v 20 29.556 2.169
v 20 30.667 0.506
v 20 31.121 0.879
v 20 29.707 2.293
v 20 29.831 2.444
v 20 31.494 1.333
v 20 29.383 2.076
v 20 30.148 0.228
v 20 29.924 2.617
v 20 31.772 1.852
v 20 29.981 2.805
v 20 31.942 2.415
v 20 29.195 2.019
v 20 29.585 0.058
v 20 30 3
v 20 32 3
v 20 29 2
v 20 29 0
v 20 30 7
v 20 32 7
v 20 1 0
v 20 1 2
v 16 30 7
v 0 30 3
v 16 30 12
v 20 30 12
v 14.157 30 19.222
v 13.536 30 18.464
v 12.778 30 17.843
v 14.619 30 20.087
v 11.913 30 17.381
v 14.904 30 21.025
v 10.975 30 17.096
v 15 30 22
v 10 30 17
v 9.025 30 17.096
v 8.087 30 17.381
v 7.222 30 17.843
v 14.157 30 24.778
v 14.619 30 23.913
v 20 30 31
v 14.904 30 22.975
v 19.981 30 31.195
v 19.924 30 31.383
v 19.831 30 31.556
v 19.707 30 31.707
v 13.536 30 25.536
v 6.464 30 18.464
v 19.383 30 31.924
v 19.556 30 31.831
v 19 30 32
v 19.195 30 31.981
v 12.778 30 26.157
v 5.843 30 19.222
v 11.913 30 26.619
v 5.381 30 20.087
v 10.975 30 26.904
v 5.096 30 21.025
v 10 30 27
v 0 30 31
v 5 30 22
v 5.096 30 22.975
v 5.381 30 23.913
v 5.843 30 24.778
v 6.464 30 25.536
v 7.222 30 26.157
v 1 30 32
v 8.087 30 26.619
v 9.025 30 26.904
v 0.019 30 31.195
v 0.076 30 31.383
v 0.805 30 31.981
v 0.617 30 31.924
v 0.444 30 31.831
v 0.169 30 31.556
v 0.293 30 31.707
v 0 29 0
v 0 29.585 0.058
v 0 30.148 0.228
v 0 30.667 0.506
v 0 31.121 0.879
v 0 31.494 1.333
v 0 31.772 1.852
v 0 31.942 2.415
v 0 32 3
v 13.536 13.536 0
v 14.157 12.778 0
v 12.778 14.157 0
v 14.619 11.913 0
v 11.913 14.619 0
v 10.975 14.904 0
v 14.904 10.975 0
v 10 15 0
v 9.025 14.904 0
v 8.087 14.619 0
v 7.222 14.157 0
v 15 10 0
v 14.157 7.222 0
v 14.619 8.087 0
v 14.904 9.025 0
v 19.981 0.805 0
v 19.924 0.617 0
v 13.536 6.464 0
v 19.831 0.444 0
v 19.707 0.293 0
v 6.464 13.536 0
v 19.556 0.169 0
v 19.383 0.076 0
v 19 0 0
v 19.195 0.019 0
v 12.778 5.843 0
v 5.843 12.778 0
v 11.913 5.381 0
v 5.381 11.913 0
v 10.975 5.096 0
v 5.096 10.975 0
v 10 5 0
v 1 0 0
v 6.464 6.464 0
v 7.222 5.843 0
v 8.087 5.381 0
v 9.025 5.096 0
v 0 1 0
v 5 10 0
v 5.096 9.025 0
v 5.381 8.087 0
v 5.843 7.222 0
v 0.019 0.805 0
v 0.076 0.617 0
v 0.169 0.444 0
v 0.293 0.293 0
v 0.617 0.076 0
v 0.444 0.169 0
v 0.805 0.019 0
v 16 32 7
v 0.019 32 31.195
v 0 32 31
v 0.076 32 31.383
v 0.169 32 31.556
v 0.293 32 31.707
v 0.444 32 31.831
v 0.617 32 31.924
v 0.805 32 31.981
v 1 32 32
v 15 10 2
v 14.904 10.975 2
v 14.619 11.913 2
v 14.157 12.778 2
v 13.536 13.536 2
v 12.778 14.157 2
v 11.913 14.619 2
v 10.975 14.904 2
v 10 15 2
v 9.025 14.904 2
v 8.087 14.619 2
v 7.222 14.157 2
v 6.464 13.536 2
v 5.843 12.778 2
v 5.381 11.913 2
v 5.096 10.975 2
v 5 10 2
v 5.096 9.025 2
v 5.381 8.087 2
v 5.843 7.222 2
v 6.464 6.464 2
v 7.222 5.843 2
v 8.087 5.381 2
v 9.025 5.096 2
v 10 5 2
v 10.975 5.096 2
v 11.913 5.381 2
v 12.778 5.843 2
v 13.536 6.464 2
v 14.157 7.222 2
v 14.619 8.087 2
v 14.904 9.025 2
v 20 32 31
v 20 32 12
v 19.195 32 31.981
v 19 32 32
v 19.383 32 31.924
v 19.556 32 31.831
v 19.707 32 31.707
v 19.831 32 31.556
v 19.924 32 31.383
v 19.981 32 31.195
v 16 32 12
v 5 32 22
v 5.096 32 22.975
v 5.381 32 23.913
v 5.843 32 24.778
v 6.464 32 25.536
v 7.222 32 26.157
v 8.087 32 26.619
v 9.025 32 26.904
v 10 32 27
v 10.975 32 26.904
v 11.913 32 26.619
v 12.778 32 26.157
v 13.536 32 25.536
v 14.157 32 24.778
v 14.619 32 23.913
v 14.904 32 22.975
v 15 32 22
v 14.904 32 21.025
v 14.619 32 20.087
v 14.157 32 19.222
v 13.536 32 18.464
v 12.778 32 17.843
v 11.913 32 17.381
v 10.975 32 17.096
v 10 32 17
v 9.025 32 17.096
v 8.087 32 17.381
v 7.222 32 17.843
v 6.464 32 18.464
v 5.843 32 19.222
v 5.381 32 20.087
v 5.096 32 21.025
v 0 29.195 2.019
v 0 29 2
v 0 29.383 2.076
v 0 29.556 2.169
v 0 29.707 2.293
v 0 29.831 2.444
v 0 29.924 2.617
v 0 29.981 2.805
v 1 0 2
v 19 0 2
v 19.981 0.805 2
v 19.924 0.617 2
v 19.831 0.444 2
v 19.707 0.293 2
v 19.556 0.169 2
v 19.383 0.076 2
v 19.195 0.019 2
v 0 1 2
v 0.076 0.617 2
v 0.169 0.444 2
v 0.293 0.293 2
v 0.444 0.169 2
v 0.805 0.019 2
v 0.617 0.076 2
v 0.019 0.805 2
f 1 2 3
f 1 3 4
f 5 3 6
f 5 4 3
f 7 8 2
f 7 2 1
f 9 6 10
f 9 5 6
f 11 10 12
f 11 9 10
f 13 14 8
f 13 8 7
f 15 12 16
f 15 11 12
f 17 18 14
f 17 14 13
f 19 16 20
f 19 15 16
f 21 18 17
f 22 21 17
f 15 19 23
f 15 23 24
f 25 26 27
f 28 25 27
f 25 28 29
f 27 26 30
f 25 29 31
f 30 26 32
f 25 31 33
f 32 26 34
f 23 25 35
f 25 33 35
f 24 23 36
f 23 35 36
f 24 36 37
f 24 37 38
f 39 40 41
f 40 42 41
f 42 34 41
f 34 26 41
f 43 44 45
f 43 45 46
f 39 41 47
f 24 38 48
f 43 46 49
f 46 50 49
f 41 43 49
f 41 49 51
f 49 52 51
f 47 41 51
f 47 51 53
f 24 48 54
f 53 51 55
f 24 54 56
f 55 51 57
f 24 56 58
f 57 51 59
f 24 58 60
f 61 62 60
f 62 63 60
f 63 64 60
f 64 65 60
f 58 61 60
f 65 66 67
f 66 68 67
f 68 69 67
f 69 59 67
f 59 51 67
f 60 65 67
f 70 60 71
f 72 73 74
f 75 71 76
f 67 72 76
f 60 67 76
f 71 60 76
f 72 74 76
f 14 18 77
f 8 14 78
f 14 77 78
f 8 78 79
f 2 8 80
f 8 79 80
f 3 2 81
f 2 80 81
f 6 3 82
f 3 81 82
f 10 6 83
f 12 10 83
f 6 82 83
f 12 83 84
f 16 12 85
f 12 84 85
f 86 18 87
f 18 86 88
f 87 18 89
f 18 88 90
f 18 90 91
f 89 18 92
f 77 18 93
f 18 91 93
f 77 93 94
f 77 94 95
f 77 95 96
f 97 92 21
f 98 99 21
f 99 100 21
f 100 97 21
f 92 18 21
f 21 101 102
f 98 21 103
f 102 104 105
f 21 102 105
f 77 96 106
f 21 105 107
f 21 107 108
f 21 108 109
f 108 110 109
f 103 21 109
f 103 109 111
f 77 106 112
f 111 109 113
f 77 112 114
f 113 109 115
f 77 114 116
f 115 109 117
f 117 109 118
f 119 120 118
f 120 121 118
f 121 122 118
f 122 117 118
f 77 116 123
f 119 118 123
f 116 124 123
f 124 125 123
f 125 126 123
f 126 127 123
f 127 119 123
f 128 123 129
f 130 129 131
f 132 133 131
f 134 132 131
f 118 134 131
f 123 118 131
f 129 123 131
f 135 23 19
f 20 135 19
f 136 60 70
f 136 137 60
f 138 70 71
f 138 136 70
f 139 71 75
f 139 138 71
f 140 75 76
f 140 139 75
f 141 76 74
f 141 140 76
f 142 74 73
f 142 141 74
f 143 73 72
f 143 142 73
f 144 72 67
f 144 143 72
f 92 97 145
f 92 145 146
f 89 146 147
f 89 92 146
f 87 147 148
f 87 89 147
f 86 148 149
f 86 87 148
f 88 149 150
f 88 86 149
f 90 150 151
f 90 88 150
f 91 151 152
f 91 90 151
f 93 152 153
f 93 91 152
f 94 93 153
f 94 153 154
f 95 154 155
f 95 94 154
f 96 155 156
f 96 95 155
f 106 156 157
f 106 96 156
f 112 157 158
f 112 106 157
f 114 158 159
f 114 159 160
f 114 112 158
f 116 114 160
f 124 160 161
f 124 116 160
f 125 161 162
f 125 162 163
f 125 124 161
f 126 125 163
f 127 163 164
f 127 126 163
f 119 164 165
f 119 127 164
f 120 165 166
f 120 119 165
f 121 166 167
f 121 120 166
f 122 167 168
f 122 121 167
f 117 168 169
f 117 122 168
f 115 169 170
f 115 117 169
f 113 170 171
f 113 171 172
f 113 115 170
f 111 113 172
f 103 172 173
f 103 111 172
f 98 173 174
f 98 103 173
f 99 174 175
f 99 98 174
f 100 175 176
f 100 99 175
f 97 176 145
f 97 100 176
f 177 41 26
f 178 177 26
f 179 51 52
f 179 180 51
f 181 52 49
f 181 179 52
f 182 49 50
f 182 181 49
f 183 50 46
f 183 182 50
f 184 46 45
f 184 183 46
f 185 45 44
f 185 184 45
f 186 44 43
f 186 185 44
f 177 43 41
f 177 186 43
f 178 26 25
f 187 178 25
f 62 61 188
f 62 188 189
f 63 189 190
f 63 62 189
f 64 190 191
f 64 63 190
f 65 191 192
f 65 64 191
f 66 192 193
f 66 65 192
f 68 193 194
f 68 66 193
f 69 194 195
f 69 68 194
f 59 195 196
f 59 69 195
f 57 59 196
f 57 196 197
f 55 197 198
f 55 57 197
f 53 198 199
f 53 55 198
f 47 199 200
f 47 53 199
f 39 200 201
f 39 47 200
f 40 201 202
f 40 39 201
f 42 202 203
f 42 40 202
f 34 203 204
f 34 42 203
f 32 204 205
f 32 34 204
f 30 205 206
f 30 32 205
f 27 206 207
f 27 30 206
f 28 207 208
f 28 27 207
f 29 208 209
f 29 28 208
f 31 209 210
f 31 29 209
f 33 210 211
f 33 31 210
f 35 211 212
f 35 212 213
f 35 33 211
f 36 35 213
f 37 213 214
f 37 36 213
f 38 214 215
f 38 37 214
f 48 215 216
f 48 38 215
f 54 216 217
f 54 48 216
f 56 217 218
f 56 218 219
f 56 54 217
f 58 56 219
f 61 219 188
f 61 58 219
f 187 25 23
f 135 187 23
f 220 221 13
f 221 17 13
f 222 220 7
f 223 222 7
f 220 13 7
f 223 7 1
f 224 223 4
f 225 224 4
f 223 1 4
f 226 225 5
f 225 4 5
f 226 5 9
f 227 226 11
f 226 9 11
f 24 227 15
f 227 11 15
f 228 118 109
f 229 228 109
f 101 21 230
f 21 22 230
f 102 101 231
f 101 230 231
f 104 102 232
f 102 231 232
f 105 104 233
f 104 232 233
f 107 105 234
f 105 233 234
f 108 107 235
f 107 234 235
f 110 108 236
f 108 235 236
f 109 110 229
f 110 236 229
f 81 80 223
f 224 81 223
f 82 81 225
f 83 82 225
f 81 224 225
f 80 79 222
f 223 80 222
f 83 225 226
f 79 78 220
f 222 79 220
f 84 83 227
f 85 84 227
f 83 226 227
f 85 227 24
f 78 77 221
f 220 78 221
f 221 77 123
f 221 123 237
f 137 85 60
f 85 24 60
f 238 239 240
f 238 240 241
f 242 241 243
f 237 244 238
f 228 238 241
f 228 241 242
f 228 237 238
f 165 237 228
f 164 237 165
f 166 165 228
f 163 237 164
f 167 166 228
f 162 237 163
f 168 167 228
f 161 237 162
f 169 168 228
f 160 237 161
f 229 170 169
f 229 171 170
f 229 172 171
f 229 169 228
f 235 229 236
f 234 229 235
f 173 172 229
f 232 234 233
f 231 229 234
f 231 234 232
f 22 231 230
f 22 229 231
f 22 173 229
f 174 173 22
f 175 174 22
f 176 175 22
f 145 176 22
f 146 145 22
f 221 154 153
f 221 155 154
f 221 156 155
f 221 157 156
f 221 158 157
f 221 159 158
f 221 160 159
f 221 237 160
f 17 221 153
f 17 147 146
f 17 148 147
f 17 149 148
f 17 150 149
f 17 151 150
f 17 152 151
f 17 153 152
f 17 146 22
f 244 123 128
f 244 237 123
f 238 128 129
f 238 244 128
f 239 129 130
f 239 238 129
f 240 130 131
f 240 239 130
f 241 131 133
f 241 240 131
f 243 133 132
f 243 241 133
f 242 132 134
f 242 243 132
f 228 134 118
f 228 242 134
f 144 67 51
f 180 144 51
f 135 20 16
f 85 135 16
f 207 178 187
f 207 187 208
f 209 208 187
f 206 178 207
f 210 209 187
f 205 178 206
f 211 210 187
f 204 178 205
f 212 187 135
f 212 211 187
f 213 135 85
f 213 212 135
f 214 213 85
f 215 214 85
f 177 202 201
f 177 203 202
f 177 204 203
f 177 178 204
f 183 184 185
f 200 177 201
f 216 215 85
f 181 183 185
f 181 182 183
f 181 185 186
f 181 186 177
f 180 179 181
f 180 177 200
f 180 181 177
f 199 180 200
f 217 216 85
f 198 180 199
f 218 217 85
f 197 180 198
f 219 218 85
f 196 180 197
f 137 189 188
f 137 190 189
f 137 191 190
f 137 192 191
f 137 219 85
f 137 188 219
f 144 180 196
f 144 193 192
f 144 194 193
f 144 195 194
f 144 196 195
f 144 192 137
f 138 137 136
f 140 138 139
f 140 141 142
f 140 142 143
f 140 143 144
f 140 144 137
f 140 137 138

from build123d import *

# Parameters (mm, degrees)
F0_W     = 20
F0_H     = 30
F0_R     = 5
F1_DEPTH = 2
F2_R     = 5
F3_DEPTH = 2
F4_W     = 20
F4_H     = 2
F5_DEPTH = 2
F6_R     = 1
F7_R     = 1
F8_R     = 3


with BuildPart() as f1:
    # F0 (on Top) → F1 (new body)
    with BuildSketch(Plane.XY):
        with Locations((10, 15)):
            Rectangle(F0_W, F0_H)
        with Locations((10, 10)):
            Circle(F0_R, mode=Mode.SUBTRACT)
    extrude(amount=F1_DEPTH)

    # F2 (on face) → F3 (join)
    with BuildSketch(Plane(origin=(0, 30, 0), x_dir=(-1, 0, 0), z_dir=(0, 1, 0))):
        Polygon((-20, 7), (-20, 2), (0, 2), (0, 32), (-20, 32), (-20, 12), (-16, 12), (-16, 7), align=None)
        with Locations((-10, 22)):
            Circle(F2_R, mode=Mode.SUBTRACT)
    extrude(amount=F3_DEPTH)

    # F4 (on face) → F5 (join)
    with BuildSketch(Plane(origin=(0, 30, 0), x_dir=(-1, 0, 0), z_dir=(0, 1, 0))):
        with Locations((-10, 1)):
            Rectangle(F4_W, F4_H)
    extrude(amount=F5_DEPTH)

    # F6
    f6_edges = [f1.edges().sort_by_distance(p)[0] for p in [
        (20, 0, 1),
        (0, 0, 1),
        (20, 31, 32),
        (0, 31, 32),
    ]]
    fillet(f6_edges, radius=F6_R)

    # F7
    f7_edges = [f1.edges().sort_by_distance(p)[0] for p in [
        (10, 30, 2),
    ]]
    fillet(f7_edges, radius=F7_R)

    # F8
    f8_edges = [f1.edges().sort_by_distance(p)[0] for p in [
        (10, 32, 0),
    ]]
    fillet(f8_edges, radius=F8_R)


solid = f1.part
